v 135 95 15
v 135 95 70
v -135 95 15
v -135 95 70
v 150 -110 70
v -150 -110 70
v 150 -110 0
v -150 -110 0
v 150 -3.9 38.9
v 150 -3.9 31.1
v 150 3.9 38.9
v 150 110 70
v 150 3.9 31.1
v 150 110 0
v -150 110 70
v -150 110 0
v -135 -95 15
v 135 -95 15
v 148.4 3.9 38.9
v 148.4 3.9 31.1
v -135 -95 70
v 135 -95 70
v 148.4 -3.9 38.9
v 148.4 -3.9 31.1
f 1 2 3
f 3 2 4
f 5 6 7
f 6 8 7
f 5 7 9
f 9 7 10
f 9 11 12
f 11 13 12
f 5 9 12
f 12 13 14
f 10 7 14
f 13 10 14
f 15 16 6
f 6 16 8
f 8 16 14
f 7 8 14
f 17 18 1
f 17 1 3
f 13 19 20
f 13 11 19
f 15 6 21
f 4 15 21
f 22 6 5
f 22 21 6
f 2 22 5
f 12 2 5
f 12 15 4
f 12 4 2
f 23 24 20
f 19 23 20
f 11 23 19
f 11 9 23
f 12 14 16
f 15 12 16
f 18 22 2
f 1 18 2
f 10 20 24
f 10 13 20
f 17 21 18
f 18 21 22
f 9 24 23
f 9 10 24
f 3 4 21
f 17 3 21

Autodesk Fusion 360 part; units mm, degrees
sketch "Sketch1" plane through (0, 0, 0) normal (0, 0, 1) x (1, 0, 0) in component "bottom"
  line L0 (150, 110) -> (-150, 110)
  line L1 (-150, 110) -> (-150, -110)
  line L2 (-150, -110) -> (150, -110)
  line L3 (150, -110) -> (150, 110)
  line L4 (150, 110) -> (-150, -110) construction
  line L5 (-150, 110) -> (150, -110) construction
  dimension "d1" = 300
  dimension "d2" = 220
extrude "Extrude1" add sketch "Sketch1" along normal blind 70 in component "bottom"
sketch "Sketch2" plane through (150, 0, 0) normal (1, 0, 0) x (0, 1, 0) in component "bottom"
  line L0 (-110, 0) -> (110, 0)
  line L1 (110, 0) -> (110, 70)
  line L2 (110, 70) -> (-110, 70)
  line L3 (-110, 70) -> (-110, 0)
  line L4 (-12.5, 47.5) -> (12.5, 47.5)
  line L5 (12.5, 47.5) -> (12.5, 22.5)
  line L6 (12.5, 22.5) -> (-12.5, 22.5)
  line L7 (-12.5, 22.5) -> (-12.5, 47.5)
  line L8 (-12.5, 47.5) -> (12.5, 22.5) construction
  line L9 (12.5, 47.5) -> (-12.5, 22.5) construction
  line L10 (3.9, 31.1) -> (-3.9, 31.1)
  line L11 (-3.9, 31.1) -> (-3.9, 38.9)
  line L12 (-3.9, 38.9) -> (3.9, 38.9)
  line L13 (3.9, 38.9) -> (3.9, 31.1)
  point P0 (0, 35)
  dimension "d5" = 25
  dimension "d6" = 25
  dimension "d7" = 8.6
extrude "Extrude2" cut sketch "Sketch2" against normal blind 1.6 contours L10 L11 L12 L13 in component "bottom"
sketch "Sketch3" plane through (0, 0, 70) normal (0, 0, 1) x (-1, 0, 0) in component "bottom"
  line L0 (-150, 110) -> (-150, -110)
  line L1 (-150, -110) -> (150, -110)
  line L2 (150, -110) -> (150, 110)
  line L3 (150, 110) -> (-150, 110)
  line L4 (135, 95) -> (-135, 95)
  line L5 (-135, 95) -> (-135, -95)
  line L6 (-135, -95) -> (135, -95)
  line L7 (135, -95) -> (135, 95)
  dimension "d10" = -15
extrude "Extrude3" cut sketch "Sketch3" against normal up to surface (55 mm away) contours L4 L5 L6 L7 in component "bottom"
component "bottom" placed x (1, 0, 0) y (0, 1, 0) z (0, 0, 1) at (0, 0, 0)
component "top" placed x (1, 0, 0) y (0, 1, 0) z (0, 0, 1) at (0, 0, 0)
